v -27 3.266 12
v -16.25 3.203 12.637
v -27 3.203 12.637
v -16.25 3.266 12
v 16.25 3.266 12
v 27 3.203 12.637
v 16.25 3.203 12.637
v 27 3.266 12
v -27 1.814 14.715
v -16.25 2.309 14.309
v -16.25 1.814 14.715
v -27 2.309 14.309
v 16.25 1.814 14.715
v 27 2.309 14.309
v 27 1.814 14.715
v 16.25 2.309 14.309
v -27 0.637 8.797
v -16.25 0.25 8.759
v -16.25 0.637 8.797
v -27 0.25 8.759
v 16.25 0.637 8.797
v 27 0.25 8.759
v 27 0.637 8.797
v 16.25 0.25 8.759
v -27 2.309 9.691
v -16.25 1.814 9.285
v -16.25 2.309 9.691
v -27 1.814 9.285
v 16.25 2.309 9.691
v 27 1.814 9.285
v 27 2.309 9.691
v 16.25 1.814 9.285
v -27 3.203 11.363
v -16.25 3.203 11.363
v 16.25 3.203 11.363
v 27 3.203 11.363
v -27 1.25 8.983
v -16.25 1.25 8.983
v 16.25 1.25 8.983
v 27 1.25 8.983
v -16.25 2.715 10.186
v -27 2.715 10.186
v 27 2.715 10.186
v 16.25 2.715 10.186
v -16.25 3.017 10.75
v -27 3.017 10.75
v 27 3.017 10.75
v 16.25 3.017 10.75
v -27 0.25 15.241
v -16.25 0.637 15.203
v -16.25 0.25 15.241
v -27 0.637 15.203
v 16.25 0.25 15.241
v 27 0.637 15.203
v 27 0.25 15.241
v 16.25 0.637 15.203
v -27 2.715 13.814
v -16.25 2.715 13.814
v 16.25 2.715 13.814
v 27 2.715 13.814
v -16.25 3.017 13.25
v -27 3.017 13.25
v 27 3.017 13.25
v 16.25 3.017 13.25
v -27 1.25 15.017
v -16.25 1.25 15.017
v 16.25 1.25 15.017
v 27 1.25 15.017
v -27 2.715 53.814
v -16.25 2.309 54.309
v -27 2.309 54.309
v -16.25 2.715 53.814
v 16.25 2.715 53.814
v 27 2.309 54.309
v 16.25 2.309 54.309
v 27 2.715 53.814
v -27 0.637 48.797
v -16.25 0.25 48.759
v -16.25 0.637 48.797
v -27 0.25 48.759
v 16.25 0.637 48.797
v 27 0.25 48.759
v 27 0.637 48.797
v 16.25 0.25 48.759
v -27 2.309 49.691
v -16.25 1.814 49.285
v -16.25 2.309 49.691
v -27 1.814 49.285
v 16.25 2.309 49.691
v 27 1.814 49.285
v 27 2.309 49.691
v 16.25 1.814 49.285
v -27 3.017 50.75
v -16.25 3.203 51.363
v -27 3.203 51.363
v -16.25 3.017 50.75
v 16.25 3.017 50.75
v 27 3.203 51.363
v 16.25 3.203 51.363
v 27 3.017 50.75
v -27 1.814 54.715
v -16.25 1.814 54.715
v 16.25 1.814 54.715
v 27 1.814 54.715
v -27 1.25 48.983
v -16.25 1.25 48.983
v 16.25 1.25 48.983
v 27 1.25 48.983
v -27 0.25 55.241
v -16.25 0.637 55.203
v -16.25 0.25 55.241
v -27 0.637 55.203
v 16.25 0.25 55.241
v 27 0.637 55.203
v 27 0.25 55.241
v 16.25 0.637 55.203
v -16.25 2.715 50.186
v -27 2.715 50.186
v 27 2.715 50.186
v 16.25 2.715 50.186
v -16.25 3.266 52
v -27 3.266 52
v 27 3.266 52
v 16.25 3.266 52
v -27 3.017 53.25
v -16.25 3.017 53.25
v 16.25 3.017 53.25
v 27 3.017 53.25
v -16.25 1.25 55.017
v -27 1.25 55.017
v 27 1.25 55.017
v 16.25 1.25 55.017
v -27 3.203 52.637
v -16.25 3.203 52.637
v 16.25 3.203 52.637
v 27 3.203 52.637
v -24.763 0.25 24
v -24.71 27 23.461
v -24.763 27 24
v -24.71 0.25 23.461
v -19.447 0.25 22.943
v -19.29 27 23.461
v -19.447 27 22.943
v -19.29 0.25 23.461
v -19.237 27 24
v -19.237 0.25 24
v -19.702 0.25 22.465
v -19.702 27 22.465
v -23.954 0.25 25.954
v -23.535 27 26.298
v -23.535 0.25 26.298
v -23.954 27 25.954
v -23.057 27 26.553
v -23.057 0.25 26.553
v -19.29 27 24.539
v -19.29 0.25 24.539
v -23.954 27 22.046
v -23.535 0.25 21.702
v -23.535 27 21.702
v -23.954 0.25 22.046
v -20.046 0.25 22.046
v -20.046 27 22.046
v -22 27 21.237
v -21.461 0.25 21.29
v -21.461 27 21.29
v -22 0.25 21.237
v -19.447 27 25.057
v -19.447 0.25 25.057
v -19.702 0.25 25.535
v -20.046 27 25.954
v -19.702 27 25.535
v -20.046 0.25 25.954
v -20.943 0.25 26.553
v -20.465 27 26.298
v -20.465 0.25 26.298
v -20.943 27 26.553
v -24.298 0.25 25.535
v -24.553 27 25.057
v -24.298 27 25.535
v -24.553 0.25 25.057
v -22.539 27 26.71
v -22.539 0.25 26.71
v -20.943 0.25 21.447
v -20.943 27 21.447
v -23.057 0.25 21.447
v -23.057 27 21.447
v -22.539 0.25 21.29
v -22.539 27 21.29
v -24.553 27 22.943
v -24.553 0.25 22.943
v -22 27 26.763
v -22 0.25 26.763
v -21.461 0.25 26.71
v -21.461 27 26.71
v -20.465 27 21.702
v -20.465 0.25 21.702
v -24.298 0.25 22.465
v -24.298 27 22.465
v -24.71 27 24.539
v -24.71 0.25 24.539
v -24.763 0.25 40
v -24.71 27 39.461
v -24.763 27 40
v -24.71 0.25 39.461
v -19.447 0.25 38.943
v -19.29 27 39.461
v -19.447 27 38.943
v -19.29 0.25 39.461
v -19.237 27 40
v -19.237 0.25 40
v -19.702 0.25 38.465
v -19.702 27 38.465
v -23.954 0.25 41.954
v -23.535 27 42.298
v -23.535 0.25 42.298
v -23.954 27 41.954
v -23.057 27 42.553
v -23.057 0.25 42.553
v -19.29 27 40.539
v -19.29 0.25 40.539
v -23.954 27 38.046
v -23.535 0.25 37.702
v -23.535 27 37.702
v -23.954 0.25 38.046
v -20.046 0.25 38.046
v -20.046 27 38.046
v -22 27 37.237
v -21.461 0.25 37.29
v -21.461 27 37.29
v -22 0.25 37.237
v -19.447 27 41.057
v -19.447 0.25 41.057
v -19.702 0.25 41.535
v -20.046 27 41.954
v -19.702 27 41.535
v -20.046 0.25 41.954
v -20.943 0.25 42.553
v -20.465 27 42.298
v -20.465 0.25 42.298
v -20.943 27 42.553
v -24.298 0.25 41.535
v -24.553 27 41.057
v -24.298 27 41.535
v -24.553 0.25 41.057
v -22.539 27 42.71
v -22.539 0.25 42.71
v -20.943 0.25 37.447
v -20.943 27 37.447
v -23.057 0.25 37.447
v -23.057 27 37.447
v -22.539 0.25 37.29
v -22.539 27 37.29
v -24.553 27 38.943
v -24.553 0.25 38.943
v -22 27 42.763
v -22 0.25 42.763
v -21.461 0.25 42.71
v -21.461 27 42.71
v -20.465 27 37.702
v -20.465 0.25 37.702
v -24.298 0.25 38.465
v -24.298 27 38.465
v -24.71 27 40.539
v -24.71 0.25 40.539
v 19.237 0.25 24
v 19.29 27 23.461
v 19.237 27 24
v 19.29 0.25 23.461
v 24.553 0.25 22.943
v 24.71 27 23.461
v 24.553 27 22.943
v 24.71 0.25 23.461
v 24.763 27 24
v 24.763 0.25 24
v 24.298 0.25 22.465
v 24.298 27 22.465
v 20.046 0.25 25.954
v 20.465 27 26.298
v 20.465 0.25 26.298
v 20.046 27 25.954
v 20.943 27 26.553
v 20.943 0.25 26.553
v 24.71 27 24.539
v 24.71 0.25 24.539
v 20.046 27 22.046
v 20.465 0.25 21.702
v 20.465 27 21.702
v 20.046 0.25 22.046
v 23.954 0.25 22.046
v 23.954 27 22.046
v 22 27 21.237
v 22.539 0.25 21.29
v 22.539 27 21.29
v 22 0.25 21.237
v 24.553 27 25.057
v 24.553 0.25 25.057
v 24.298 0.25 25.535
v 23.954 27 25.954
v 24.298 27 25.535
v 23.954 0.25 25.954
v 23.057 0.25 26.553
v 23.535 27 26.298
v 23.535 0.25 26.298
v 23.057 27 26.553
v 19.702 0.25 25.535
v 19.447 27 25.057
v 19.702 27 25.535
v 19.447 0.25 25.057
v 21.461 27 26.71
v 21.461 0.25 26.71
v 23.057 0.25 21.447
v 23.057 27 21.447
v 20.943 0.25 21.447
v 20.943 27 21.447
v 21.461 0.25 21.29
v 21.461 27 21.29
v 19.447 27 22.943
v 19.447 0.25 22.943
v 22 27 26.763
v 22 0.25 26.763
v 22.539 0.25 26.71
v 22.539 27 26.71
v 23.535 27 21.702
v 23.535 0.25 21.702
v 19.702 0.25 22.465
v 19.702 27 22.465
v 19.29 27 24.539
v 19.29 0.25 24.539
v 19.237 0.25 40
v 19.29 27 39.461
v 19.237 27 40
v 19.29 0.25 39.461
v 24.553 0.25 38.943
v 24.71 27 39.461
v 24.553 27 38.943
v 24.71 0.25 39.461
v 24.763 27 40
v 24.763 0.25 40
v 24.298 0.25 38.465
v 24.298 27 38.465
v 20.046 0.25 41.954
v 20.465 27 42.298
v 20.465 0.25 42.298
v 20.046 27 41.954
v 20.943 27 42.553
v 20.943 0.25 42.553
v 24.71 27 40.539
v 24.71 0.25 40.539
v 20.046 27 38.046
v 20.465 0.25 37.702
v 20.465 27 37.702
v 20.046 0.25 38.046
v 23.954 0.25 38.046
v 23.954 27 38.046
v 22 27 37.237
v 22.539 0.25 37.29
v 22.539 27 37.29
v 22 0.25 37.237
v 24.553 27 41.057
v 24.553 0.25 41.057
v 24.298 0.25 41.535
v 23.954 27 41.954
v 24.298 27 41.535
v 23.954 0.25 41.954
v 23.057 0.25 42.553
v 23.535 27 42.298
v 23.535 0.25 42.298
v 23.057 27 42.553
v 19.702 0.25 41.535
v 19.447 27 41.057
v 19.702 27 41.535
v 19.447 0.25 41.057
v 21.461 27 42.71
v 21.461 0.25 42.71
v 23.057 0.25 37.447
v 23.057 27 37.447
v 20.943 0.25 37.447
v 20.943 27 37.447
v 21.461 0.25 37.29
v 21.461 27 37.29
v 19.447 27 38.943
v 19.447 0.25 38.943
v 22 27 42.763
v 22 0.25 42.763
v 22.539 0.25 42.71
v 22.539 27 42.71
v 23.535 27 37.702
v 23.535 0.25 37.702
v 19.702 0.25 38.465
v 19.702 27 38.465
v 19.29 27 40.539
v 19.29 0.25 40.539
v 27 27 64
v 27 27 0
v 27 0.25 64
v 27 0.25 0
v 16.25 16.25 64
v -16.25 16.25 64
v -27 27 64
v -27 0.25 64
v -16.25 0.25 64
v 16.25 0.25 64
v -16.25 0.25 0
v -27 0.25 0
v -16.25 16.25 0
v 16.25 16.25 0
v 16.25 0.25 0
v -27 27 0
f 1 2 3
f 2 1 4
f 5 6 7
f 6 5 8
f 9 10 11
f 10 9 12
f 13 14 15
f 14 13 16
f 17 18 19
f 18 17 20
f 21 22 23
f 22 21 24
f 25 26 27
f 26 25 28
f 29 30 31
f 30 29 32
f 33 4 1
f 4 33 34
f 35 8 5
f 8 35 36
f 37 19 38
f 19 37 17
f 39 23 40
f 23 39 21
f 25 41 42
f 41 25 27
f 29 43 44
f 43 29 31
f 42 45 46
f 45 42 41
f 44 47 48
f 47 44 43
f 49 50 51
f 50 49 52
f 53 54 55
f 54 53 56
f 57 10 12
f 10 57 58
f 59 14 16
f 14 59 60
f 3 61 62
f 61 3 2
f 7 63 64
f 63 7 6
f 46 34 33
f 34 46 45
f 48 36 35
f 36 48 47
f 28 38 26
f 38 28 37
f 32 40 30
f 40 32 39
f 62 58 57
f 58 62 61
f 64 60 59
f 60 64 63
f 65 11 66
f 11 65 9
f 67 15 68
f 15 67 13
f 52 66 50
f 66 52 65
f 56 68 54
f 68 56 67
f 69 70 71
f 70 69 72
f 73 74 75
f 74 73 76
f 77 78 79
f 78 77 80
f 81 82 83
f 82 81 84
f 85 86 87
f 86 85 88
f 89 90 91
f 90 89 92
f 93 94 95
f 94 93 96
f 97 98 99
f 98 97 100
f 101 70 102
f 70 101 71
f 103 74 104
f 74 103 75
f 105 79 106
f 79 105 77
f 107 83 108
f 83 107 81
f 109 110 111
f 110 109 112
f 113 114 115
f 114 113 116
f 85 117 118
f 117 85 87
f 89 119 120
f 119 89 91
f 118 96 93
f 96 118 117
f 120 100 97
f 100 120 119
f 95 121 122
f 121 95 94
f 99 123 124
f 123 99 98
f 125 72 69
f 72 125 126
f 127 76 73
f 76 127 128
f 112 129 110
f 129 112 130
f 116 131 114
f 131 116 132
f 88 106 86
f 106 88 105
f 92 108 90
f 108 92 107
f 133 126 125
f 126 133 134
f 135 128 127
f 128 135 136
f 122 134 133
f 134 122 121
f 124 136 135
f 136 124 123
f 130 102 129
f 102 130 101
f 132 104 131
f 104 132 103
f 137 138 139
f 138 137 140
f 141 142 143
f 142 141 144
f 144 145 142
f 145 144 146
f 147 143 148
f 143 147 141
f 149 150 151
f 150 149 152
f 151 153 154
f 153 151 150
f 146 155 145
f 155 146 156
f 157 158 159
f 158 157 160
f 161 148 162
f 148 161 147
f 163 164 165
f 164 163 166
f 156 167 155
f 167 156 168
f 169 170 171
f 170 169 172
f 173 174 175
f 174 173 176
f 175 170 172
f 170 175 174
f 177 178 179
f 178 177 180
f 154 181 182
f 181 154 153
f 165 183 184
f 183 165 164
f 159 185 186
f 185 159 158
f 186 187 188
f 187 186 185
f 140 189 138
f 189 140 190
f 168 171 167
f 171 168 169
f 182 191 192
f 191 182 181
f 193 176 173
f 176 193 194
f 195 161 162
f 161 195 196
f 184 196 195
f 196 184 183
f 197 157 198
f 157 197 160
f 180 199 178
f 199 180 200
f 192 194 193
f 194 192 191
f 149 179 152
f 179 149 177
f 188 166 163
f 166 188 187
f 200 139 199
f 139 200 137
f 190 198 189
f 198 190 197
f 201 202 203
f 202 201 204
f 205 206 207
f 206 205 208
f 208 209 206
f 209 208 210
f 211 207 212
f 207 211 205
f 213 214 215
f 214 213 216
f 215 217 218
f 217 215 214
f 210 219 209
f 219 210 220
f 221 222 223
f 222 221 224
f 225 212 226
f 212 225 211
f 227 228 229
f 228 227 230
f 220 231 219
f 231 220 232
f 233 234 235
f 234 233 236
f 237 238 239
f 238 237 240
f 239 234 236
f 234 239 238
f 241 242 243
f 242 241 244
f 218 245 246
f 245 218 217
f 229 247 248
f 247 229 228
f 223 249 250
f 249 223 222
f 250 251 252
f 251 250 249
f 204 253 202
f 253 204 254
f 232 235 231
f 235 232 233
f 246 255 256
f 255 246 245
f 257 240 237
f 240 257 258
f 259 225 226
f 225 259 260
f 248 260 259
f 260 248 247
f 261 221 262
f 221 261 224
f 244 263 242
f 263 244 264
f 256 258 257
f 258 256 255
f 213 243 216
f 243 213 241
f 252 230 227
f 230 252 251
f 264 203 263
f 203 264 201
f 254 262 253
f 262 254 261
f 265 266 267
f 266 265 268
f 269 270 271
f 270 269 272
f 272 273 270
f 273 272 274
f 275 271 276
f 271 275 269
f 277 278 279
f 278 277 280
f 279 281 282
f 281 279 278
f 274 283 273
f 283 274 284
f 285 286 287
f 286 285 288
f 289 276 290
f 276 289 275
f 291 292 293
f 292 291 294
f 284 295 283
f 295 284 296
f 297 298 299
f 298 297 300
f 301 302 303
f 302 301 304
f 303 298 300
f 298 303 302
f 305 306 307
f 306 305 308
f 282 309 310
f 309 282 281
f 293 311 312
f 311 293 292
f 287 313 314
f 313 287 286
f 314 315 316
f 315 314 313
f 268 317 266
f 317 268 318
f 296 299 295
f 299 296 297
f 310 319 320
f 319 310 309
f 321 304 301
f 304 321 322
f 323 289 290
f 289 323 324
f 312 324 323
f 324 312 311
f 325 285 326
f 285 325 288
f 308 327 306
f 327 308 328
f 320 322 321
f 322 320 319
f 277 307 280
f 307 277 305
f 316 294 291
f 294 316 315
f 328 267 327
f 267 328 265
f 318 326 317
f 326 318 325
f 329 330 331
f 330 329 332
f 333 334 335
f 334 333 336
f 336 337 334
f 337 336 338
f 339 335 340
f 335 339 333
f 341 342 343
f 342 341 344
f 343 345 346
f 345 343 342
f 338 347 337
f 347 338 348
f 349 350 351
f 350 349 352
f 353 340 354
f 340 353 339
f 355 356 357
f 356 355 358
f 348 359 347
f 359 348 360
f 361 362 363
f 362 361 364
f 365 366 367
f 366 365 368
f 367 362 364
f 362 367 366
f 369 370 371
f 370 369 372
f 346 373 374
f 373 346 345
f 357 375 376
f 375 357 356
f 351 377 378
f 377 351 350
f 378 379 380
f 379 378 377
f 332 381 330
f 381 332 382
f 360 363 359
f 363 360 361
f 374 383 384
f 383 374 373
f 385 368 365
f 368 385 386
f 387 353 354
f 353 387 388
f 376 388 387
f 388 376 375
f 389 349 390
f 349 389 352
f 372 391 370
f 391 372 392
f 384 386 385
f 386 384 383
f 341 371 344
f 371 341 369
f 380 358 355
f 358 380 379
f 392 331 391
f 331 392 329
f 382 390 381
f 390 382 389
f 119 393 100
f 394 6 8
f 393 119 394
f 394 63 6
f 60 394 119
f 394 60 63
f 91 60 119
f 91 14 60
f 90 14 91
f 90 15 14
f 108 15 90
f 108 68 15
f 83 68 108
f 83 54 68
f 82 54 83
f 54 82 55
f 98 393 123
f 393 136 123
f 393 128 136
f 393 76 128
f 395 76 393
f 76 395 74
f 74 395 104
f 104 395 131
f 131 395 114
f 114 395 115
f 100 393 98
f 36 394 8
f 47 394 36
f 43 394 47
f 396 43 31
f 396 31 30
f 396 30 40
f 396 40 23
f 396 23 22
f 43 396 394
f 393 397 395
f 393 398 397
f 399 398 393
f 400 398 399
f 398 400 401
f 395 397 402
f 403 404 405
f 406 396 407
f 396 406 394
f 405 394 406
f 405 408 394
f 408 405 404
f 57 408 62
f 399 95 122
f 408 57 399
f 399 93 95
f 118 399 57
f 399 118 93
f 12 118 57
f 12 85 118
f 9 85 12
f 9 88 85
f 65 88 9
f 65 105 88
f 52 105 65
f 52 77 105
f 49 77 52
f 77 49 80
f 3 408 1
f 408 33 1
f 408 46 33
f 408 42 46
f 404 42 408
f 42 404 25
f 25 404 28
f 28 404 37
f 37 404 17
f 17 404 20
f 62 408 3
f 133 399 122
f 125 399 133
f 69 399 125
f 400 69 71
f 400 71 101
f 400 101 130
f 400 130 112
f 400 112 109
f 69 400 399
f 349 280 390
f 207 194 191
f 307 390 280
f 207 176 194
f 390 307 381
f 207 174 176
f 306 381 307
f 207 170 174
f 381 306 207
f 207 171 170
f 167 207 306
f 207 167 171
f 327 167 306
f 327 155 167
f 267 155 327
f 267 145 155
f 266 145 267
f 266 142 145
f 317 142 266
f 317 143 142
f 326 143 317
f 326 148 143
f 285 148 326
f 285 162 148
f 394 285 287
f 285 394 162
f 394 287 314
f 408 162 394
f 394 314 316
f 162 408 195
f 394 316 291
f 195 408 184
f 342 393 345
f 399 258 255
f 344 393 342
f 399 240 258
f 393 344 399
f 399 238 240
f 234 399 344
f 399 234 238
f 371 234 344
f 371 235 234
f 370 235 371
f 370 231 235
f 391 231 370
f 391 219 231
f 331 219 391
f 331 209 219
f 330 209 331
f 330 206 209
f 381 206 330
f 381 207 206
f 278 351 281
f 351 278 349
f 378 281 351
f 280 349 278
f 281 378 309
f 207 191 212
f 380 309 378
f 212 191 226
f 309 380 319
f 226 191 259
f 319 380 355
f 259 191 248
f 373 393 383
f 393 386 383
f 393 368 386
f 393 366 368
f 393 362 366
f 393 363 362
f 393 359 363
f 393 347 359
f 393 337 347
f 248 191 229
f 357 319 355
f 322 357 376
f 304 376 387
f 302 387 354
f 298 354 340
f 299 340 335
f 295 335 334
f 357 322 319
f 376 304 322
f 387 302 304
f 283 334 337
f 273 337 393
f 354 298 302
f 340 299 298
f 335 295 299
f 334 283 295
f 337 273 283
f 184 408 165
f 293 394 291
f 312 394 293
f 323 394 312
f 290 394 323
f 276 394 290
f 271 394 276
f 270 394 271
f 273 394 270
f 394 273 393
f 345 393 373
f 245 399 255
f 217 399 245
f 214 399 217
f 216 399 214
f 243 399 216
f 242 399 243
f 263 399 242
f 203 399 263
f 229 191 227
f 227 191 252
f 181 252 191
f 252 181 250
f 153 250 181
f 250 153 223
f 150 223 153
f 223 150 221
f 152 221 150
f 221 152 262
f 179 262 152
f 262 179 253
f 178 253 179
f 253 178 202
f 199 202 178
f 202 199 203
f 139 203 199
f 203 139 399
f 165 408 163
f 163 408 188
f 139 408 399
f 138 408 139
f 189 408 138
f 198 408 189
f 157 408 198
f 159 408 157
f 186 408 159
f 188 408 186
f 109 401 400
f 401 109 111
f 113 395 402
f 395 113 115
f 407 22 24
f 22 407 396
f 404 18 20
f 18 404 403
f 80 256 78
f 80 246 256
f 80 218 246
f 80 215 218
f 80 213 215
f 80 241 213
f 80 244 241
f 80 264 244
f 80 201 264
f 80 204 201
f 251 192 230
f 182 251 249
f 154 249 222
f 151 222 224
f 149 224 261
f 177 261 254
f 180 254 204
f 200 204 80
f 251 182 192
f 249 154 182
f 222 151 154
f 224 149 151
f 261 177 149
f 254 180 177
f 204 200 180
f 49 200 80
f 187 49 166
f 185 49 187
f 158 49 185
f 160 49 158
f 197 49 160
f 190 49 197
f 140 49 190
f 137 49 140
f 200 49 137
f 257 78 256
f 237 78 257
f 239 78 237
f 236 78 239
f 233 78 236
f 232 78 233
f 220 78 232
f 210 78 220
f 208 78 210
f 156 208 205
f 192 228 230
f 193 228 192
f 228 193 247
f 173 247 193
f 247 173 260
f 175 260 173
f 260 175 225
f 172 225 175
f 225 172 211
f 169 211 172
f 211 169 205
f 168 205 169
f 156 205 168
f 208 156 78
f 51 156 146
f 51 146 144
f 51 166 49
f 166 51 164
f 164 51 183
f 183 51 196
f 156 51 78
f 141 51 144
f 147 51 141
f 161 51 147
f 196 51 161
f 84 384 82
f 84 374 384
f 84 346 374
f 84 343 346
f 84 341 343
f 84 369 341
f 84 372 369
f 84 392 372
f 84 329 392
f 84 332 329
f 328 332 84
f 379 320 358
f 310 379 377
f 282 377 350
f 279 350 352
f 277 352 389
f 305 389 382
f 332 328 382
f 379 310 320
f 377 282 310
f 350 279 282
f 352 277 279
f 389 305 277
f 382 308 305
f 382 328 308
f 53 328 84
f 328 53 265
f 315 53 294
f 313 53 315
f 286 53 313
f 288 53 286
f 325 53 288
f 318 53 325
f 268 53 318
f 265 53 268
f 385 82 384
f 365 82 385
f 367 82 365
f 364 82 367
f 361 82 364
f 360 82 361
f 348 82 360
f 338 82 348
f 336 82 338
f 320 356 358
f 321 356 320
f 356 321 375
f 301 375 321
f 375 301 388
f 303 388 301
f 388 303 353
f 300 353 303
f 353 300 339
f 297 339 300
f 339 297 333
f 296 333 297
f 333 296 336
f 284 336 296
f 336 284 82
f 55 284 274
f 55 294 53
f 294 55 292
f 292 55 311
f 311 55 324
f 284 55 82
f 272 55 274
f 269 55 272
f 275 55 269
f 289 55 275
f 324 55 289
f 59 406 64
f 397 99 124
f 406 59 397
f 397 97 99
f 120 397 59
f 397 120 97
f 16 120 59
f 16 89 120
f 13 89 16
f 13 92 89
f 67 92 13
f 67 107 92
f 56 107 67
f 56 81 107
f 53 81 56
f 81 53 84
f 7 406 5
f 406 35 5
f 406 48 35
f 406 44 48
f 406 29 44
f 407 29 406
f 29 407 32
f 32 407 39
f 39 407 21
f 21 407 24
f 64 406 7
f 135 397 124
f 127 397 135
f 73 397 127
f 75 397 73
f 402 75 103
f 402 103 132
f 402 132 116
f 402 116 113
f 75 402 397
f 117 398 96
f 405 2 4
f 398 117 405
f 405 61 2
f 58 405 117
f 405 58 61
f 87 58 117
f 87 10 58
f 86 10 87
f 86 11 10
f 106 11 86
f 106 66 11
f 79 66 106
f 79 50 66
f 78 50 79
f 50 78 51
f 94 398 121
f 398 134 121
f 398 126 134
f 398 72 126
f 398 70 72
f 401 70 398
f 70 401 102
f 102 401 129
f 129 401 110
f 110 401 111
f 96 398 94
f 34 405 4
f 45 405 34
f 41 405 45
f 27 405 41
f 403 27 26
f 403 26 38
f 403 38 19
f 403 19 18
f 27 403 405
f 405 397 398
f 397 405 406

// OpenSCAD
// file: ../../../../../scad/lib/parent_spar_bolted.scad
// Parent modular exterior v2. mm. Geometry shared by individual part wrappers.
// Metal fasteners, ballast, Takachi box and electronics are purchased items.
/* [Dimensions] */
disk_d=225; disk_t=5;
fin_h=125; fin_w=65; fin_t=4;
beam_w=32; clearance=0.5;
float_r=100; flange_r=112.5; float_bore_r=30;
float_wall=4; float_h=180; lid_t=6;
rod_r=105.5; flange_t=6;
hub_h=32; root_x=30; root_depth=14;
$fn=96; e=0.03;
assert(disk_d<=225 && 2*flange_r<=225);
assert(fin_h>=100 && fin_h<=150 && fin_w>=50 && fin_w<=80);
assert(root_x+fin_w<disk_d/2-5);
module bore(d,h) { cylinder(d=d/cos(180/32),h=h,$fn=32); }
module bore_x(d,l) { rotate([0,90,0]) bore(d,l); }
module bore_y(d,l) { rotate([-90,0,0]) bore(d,l); }
module square_bore(h) { translate([-(beam_w+clearance)/2,-(beam_w+clearance)/2,-e]) cube([beam_w+clearance,beam_w+clearance,h+2*e]); }
module rods(h,d=6.5) { for(a=[45:90:315]) rotate([0,0,a]) translate([rod_r,0,-e]) bore(d,h+2*e); }
module lid_bolts(h) { for(a=[22.5:45:359]) rotate([0,0,a]) translate([rod_r,0,-e]) bore(4.5,h+2*e); }
module hub_pin(z) { translate([-46,10,z]) bore_x(6.5,92); }
module disk() {
 difference() { cylinder(d=disk_d,h=disk_t); square_bore(disk_t);
  for(x=[-23,23],y=[-23,23]) translate([x,y,-e]) bore(5.5,disk_t+2*e);
 }
}
module fin() {
 difference() { cube([fin_w,fin_t,fin_h]);
  for(z=[10,fin_h-hub_h+10]) translate([root_depth/2,-e,z]) bore_y(5.5,fin_t+2*e);
 }
}
module hub() {
 difference() {
  union() { translate([-30,-30,0]) cube([60,60,hub_h]);
   for(a=[0:90:270]) rotate([0,0,a]) translate([28,-16,0]) cube([16,32,hub_h]);
  }
  square_bore(hub_h);
  for(a=[0:90:270]) rotate([0,0,a]) {
   translate([root_x-clearance/2,-(fin_t+clearance)/2,-e]) cube([root_depth+clearance,fin_t+clearance,hub_h+2*e]);
   translate([root_x+root_depth/2,-17,10]) bore_y(5.5,34);
  }
  for(x=[-23,23],y=[-23,23]) translate([x,y,-e]) bore(5.5,hub_h+2*e);
  hub_pin(24);
 }
}
module beam(lower=true) {
 len=lower?180:107;
 difference() { translate([-beam_w/2,-beam_w/2,0]) cube([beam_w,beam_w,len]);
  if(lower) { for(z=[24,117]) hub_pin(z); translate([-20,0,160]) bore_x(6.5,40); translate([0,0,-e]) bore(16,8); }
  else for(z=[20,87]) translate([-20,0,z]) bore_x(6.5,40);
 }
}
module coupler() {
 // One half of a screwed split coupler. Mirror Y for the second half.
 difference() { translate([-27,0.25,0]) cube([54,26.75,64]); square_bore(64);
  for(z=[12,52]) translate([-28,0,z]) bore_x(6.5,56);
  for(x=[-22,22],z=[24,40]) translate([x,-1,z]) bore_y(5.5,29);
 }
}
module float_body() {
 difference() {
  union() { cylinder(r=float_r,h=float_h);
   translate([0,0,float_h-flange_t]) cylinder(r=flange_r,h=flange_t);
   // 45-degree underside of the flange instead of a 15 mm unsupported ledge.
   translate([0,0,float_h-flange_t-(flange_r-float_r)]) cylinder(r1=float_r,r2=flange_r,h=flange_r-float_r);
  }
  translate([0,0,-e]) cylinder(r=float_bore_r,h=float_h+2*e);
  translate([0,0,float_wall]) difference() {
   cylinder(r=float_r-float_wall,h=float_h);
   cylinder(r=float_bore_r+float_wall,h=float_h+e);
  }
  // Coupling-nut clearance; nearest cavity wall remains >=3 mm thick.
  rods(float_h,13); lid_bolts(float_h);
  for(a=[22.5:45:359]) rotate([0,0,a]) translate([rod_r,0,-e]) bore(10,float_h-flange_t+e);
 }
}
module float_lid() {
 difference() {
  cylinder(r=flange_r,h=lid_t);
  translate([0,0,-e]) cylinder(r=float_bore_r,h=lid_t+2*e);
  rods(lid_t,13); lid_bolts(lid_t);
  // Continuous face seals: 2 mm cord, 2.4 wide x 1.5 deep grooves.
  for(r=[float_bore_r+float_wall/2,float_r-float_wall/2]) translate([0,0,-e]) difference() {
   cylinder(r=r+1.2,h=1.5+e); cylinder(r=r-1.2,h=1.5+2*e);
  }
 }
}
module float_end(top=true) {
 difference() {
  union() { cylinder(r=flange_r,h=8);
   if(top) translate([-30,-30,8-e]) cube([60,60,20+e]);
   else translate([-23,-23,-40]) cube([46,46,40+e]);
  }
  rods(8);
  if(top) for(x=[-20,20],y=[-20,20]) {
   translate([x,y,-e]) bore(5.5,29);
   translate([x,y,-e]) bore(11,18+e);
  }
  if(top) for(a=[22.5:45:359]) rotate([0,0,a]) translate([rod_r,0,-e]) bore(12,8+2*e);
  else { translate([0,0,-40]) square_bore(40-e);
   translate([-24,0,-20]) bore_x(6.5,48);
  }
 }
}
module ballast_body() {
 // Open upward in print orientation. In the assembly this cup is inverted.
 difference() {
  union() { cylinder(r=45,h=51); translate([0,0,45]) cylinder(r=60,h=6);
   translate([0,0,30]) cylinder(r1=45,r2=60,h=15);
  }
  translate([0,0,6]) cylinder(r=40,h=46);
  for(x=[-23,23],y=[-23,23]) translate([x,y,-e]) bore(5.5,7);
  translate([0,0,-e]) bore(8.5,7);
  for(a=[0:90:270]) rotate([0,0,a]) translate([52,0,29]) { bore(5.5,23); bore(12,16); }
 }
}
module ballast_lid() {
 difference() { cylinder(r=60,h=6);
  for(a=[0:90:270]) rotate([0,0,a]) translate([52,0,-e]) bore(5.5,7);
  // Flooded ballast compartment: drainage, no trapped air assumption.
  for(x=[-20,0,20]) translate([x,0,-e]) bore(6,7);
 }
}
module camera_bridge() {
 // Assembly frame: local top z=78; camera seat z=8. +Y faces camera front.
 difference() {
  union() {
   translate([-30,45,70]) cube([60,90,8]);
   translate([-70,125,0]) cube([140,100,8]);
   translate([-70,125,0]) cube([140,10,78]);
   for(x=[-64,56]) translate([x,0,0]) rotate([90,0,90]) linear_extrude(8)
    polygon([[135,8],[215,8],[135,70]]);
  }
  for(x=[-20,20],y=[50,90]) translate([x,y,69]) bore(5.5,10);
  for(x=[-11,11],y=[174,206]) translate([x,y,-e]) bore(5.5,10);
 }
}
module gps_bridge() {
 // Local attachment face X=0 at deck +X; top shelf z=175.
 difference() {
  union() { translate([0,-25,0]) cube([10,50,183]);
   translate([-90,-48,175]) cube([100,96,8]);
   for(y=[-17,25]) translate([0,y,0]) rotate([90,0,0]) linear_extrude(8)
    polygon([[e,155],[e,175+e],[-80,175+e]]);
  }
  for(y=[-20,20],z=[5,45]) translate([-e,y,z]) bore_x(5.5,11);
  for(y=[-34,34]) translate([-43,y,174]) bore(4.5,10);
 }
}
// Reference antenna envelope, correct mounting ears, not a printable antenna.
module gps_reference() {
 difference() {
  union() { translate([-30,-28,0]) cube([60,56,22.5]);
   translate([-10,-41,0]) cube([20,82,6]); }
  for(y=[-34,34]) translate([0,y,-e]) bore(4.5,7);
 }
}
// main file
// mm. part=print is the intended X1C orientation.
part="assembly"; // [assembly,print]
use <../../../../../scad/lib/parent_spar_bolted.scad>
if(part=="print") { translate([0,0,27]) rotate([-90,0,0]) coupler(); } else { coupler(); }
